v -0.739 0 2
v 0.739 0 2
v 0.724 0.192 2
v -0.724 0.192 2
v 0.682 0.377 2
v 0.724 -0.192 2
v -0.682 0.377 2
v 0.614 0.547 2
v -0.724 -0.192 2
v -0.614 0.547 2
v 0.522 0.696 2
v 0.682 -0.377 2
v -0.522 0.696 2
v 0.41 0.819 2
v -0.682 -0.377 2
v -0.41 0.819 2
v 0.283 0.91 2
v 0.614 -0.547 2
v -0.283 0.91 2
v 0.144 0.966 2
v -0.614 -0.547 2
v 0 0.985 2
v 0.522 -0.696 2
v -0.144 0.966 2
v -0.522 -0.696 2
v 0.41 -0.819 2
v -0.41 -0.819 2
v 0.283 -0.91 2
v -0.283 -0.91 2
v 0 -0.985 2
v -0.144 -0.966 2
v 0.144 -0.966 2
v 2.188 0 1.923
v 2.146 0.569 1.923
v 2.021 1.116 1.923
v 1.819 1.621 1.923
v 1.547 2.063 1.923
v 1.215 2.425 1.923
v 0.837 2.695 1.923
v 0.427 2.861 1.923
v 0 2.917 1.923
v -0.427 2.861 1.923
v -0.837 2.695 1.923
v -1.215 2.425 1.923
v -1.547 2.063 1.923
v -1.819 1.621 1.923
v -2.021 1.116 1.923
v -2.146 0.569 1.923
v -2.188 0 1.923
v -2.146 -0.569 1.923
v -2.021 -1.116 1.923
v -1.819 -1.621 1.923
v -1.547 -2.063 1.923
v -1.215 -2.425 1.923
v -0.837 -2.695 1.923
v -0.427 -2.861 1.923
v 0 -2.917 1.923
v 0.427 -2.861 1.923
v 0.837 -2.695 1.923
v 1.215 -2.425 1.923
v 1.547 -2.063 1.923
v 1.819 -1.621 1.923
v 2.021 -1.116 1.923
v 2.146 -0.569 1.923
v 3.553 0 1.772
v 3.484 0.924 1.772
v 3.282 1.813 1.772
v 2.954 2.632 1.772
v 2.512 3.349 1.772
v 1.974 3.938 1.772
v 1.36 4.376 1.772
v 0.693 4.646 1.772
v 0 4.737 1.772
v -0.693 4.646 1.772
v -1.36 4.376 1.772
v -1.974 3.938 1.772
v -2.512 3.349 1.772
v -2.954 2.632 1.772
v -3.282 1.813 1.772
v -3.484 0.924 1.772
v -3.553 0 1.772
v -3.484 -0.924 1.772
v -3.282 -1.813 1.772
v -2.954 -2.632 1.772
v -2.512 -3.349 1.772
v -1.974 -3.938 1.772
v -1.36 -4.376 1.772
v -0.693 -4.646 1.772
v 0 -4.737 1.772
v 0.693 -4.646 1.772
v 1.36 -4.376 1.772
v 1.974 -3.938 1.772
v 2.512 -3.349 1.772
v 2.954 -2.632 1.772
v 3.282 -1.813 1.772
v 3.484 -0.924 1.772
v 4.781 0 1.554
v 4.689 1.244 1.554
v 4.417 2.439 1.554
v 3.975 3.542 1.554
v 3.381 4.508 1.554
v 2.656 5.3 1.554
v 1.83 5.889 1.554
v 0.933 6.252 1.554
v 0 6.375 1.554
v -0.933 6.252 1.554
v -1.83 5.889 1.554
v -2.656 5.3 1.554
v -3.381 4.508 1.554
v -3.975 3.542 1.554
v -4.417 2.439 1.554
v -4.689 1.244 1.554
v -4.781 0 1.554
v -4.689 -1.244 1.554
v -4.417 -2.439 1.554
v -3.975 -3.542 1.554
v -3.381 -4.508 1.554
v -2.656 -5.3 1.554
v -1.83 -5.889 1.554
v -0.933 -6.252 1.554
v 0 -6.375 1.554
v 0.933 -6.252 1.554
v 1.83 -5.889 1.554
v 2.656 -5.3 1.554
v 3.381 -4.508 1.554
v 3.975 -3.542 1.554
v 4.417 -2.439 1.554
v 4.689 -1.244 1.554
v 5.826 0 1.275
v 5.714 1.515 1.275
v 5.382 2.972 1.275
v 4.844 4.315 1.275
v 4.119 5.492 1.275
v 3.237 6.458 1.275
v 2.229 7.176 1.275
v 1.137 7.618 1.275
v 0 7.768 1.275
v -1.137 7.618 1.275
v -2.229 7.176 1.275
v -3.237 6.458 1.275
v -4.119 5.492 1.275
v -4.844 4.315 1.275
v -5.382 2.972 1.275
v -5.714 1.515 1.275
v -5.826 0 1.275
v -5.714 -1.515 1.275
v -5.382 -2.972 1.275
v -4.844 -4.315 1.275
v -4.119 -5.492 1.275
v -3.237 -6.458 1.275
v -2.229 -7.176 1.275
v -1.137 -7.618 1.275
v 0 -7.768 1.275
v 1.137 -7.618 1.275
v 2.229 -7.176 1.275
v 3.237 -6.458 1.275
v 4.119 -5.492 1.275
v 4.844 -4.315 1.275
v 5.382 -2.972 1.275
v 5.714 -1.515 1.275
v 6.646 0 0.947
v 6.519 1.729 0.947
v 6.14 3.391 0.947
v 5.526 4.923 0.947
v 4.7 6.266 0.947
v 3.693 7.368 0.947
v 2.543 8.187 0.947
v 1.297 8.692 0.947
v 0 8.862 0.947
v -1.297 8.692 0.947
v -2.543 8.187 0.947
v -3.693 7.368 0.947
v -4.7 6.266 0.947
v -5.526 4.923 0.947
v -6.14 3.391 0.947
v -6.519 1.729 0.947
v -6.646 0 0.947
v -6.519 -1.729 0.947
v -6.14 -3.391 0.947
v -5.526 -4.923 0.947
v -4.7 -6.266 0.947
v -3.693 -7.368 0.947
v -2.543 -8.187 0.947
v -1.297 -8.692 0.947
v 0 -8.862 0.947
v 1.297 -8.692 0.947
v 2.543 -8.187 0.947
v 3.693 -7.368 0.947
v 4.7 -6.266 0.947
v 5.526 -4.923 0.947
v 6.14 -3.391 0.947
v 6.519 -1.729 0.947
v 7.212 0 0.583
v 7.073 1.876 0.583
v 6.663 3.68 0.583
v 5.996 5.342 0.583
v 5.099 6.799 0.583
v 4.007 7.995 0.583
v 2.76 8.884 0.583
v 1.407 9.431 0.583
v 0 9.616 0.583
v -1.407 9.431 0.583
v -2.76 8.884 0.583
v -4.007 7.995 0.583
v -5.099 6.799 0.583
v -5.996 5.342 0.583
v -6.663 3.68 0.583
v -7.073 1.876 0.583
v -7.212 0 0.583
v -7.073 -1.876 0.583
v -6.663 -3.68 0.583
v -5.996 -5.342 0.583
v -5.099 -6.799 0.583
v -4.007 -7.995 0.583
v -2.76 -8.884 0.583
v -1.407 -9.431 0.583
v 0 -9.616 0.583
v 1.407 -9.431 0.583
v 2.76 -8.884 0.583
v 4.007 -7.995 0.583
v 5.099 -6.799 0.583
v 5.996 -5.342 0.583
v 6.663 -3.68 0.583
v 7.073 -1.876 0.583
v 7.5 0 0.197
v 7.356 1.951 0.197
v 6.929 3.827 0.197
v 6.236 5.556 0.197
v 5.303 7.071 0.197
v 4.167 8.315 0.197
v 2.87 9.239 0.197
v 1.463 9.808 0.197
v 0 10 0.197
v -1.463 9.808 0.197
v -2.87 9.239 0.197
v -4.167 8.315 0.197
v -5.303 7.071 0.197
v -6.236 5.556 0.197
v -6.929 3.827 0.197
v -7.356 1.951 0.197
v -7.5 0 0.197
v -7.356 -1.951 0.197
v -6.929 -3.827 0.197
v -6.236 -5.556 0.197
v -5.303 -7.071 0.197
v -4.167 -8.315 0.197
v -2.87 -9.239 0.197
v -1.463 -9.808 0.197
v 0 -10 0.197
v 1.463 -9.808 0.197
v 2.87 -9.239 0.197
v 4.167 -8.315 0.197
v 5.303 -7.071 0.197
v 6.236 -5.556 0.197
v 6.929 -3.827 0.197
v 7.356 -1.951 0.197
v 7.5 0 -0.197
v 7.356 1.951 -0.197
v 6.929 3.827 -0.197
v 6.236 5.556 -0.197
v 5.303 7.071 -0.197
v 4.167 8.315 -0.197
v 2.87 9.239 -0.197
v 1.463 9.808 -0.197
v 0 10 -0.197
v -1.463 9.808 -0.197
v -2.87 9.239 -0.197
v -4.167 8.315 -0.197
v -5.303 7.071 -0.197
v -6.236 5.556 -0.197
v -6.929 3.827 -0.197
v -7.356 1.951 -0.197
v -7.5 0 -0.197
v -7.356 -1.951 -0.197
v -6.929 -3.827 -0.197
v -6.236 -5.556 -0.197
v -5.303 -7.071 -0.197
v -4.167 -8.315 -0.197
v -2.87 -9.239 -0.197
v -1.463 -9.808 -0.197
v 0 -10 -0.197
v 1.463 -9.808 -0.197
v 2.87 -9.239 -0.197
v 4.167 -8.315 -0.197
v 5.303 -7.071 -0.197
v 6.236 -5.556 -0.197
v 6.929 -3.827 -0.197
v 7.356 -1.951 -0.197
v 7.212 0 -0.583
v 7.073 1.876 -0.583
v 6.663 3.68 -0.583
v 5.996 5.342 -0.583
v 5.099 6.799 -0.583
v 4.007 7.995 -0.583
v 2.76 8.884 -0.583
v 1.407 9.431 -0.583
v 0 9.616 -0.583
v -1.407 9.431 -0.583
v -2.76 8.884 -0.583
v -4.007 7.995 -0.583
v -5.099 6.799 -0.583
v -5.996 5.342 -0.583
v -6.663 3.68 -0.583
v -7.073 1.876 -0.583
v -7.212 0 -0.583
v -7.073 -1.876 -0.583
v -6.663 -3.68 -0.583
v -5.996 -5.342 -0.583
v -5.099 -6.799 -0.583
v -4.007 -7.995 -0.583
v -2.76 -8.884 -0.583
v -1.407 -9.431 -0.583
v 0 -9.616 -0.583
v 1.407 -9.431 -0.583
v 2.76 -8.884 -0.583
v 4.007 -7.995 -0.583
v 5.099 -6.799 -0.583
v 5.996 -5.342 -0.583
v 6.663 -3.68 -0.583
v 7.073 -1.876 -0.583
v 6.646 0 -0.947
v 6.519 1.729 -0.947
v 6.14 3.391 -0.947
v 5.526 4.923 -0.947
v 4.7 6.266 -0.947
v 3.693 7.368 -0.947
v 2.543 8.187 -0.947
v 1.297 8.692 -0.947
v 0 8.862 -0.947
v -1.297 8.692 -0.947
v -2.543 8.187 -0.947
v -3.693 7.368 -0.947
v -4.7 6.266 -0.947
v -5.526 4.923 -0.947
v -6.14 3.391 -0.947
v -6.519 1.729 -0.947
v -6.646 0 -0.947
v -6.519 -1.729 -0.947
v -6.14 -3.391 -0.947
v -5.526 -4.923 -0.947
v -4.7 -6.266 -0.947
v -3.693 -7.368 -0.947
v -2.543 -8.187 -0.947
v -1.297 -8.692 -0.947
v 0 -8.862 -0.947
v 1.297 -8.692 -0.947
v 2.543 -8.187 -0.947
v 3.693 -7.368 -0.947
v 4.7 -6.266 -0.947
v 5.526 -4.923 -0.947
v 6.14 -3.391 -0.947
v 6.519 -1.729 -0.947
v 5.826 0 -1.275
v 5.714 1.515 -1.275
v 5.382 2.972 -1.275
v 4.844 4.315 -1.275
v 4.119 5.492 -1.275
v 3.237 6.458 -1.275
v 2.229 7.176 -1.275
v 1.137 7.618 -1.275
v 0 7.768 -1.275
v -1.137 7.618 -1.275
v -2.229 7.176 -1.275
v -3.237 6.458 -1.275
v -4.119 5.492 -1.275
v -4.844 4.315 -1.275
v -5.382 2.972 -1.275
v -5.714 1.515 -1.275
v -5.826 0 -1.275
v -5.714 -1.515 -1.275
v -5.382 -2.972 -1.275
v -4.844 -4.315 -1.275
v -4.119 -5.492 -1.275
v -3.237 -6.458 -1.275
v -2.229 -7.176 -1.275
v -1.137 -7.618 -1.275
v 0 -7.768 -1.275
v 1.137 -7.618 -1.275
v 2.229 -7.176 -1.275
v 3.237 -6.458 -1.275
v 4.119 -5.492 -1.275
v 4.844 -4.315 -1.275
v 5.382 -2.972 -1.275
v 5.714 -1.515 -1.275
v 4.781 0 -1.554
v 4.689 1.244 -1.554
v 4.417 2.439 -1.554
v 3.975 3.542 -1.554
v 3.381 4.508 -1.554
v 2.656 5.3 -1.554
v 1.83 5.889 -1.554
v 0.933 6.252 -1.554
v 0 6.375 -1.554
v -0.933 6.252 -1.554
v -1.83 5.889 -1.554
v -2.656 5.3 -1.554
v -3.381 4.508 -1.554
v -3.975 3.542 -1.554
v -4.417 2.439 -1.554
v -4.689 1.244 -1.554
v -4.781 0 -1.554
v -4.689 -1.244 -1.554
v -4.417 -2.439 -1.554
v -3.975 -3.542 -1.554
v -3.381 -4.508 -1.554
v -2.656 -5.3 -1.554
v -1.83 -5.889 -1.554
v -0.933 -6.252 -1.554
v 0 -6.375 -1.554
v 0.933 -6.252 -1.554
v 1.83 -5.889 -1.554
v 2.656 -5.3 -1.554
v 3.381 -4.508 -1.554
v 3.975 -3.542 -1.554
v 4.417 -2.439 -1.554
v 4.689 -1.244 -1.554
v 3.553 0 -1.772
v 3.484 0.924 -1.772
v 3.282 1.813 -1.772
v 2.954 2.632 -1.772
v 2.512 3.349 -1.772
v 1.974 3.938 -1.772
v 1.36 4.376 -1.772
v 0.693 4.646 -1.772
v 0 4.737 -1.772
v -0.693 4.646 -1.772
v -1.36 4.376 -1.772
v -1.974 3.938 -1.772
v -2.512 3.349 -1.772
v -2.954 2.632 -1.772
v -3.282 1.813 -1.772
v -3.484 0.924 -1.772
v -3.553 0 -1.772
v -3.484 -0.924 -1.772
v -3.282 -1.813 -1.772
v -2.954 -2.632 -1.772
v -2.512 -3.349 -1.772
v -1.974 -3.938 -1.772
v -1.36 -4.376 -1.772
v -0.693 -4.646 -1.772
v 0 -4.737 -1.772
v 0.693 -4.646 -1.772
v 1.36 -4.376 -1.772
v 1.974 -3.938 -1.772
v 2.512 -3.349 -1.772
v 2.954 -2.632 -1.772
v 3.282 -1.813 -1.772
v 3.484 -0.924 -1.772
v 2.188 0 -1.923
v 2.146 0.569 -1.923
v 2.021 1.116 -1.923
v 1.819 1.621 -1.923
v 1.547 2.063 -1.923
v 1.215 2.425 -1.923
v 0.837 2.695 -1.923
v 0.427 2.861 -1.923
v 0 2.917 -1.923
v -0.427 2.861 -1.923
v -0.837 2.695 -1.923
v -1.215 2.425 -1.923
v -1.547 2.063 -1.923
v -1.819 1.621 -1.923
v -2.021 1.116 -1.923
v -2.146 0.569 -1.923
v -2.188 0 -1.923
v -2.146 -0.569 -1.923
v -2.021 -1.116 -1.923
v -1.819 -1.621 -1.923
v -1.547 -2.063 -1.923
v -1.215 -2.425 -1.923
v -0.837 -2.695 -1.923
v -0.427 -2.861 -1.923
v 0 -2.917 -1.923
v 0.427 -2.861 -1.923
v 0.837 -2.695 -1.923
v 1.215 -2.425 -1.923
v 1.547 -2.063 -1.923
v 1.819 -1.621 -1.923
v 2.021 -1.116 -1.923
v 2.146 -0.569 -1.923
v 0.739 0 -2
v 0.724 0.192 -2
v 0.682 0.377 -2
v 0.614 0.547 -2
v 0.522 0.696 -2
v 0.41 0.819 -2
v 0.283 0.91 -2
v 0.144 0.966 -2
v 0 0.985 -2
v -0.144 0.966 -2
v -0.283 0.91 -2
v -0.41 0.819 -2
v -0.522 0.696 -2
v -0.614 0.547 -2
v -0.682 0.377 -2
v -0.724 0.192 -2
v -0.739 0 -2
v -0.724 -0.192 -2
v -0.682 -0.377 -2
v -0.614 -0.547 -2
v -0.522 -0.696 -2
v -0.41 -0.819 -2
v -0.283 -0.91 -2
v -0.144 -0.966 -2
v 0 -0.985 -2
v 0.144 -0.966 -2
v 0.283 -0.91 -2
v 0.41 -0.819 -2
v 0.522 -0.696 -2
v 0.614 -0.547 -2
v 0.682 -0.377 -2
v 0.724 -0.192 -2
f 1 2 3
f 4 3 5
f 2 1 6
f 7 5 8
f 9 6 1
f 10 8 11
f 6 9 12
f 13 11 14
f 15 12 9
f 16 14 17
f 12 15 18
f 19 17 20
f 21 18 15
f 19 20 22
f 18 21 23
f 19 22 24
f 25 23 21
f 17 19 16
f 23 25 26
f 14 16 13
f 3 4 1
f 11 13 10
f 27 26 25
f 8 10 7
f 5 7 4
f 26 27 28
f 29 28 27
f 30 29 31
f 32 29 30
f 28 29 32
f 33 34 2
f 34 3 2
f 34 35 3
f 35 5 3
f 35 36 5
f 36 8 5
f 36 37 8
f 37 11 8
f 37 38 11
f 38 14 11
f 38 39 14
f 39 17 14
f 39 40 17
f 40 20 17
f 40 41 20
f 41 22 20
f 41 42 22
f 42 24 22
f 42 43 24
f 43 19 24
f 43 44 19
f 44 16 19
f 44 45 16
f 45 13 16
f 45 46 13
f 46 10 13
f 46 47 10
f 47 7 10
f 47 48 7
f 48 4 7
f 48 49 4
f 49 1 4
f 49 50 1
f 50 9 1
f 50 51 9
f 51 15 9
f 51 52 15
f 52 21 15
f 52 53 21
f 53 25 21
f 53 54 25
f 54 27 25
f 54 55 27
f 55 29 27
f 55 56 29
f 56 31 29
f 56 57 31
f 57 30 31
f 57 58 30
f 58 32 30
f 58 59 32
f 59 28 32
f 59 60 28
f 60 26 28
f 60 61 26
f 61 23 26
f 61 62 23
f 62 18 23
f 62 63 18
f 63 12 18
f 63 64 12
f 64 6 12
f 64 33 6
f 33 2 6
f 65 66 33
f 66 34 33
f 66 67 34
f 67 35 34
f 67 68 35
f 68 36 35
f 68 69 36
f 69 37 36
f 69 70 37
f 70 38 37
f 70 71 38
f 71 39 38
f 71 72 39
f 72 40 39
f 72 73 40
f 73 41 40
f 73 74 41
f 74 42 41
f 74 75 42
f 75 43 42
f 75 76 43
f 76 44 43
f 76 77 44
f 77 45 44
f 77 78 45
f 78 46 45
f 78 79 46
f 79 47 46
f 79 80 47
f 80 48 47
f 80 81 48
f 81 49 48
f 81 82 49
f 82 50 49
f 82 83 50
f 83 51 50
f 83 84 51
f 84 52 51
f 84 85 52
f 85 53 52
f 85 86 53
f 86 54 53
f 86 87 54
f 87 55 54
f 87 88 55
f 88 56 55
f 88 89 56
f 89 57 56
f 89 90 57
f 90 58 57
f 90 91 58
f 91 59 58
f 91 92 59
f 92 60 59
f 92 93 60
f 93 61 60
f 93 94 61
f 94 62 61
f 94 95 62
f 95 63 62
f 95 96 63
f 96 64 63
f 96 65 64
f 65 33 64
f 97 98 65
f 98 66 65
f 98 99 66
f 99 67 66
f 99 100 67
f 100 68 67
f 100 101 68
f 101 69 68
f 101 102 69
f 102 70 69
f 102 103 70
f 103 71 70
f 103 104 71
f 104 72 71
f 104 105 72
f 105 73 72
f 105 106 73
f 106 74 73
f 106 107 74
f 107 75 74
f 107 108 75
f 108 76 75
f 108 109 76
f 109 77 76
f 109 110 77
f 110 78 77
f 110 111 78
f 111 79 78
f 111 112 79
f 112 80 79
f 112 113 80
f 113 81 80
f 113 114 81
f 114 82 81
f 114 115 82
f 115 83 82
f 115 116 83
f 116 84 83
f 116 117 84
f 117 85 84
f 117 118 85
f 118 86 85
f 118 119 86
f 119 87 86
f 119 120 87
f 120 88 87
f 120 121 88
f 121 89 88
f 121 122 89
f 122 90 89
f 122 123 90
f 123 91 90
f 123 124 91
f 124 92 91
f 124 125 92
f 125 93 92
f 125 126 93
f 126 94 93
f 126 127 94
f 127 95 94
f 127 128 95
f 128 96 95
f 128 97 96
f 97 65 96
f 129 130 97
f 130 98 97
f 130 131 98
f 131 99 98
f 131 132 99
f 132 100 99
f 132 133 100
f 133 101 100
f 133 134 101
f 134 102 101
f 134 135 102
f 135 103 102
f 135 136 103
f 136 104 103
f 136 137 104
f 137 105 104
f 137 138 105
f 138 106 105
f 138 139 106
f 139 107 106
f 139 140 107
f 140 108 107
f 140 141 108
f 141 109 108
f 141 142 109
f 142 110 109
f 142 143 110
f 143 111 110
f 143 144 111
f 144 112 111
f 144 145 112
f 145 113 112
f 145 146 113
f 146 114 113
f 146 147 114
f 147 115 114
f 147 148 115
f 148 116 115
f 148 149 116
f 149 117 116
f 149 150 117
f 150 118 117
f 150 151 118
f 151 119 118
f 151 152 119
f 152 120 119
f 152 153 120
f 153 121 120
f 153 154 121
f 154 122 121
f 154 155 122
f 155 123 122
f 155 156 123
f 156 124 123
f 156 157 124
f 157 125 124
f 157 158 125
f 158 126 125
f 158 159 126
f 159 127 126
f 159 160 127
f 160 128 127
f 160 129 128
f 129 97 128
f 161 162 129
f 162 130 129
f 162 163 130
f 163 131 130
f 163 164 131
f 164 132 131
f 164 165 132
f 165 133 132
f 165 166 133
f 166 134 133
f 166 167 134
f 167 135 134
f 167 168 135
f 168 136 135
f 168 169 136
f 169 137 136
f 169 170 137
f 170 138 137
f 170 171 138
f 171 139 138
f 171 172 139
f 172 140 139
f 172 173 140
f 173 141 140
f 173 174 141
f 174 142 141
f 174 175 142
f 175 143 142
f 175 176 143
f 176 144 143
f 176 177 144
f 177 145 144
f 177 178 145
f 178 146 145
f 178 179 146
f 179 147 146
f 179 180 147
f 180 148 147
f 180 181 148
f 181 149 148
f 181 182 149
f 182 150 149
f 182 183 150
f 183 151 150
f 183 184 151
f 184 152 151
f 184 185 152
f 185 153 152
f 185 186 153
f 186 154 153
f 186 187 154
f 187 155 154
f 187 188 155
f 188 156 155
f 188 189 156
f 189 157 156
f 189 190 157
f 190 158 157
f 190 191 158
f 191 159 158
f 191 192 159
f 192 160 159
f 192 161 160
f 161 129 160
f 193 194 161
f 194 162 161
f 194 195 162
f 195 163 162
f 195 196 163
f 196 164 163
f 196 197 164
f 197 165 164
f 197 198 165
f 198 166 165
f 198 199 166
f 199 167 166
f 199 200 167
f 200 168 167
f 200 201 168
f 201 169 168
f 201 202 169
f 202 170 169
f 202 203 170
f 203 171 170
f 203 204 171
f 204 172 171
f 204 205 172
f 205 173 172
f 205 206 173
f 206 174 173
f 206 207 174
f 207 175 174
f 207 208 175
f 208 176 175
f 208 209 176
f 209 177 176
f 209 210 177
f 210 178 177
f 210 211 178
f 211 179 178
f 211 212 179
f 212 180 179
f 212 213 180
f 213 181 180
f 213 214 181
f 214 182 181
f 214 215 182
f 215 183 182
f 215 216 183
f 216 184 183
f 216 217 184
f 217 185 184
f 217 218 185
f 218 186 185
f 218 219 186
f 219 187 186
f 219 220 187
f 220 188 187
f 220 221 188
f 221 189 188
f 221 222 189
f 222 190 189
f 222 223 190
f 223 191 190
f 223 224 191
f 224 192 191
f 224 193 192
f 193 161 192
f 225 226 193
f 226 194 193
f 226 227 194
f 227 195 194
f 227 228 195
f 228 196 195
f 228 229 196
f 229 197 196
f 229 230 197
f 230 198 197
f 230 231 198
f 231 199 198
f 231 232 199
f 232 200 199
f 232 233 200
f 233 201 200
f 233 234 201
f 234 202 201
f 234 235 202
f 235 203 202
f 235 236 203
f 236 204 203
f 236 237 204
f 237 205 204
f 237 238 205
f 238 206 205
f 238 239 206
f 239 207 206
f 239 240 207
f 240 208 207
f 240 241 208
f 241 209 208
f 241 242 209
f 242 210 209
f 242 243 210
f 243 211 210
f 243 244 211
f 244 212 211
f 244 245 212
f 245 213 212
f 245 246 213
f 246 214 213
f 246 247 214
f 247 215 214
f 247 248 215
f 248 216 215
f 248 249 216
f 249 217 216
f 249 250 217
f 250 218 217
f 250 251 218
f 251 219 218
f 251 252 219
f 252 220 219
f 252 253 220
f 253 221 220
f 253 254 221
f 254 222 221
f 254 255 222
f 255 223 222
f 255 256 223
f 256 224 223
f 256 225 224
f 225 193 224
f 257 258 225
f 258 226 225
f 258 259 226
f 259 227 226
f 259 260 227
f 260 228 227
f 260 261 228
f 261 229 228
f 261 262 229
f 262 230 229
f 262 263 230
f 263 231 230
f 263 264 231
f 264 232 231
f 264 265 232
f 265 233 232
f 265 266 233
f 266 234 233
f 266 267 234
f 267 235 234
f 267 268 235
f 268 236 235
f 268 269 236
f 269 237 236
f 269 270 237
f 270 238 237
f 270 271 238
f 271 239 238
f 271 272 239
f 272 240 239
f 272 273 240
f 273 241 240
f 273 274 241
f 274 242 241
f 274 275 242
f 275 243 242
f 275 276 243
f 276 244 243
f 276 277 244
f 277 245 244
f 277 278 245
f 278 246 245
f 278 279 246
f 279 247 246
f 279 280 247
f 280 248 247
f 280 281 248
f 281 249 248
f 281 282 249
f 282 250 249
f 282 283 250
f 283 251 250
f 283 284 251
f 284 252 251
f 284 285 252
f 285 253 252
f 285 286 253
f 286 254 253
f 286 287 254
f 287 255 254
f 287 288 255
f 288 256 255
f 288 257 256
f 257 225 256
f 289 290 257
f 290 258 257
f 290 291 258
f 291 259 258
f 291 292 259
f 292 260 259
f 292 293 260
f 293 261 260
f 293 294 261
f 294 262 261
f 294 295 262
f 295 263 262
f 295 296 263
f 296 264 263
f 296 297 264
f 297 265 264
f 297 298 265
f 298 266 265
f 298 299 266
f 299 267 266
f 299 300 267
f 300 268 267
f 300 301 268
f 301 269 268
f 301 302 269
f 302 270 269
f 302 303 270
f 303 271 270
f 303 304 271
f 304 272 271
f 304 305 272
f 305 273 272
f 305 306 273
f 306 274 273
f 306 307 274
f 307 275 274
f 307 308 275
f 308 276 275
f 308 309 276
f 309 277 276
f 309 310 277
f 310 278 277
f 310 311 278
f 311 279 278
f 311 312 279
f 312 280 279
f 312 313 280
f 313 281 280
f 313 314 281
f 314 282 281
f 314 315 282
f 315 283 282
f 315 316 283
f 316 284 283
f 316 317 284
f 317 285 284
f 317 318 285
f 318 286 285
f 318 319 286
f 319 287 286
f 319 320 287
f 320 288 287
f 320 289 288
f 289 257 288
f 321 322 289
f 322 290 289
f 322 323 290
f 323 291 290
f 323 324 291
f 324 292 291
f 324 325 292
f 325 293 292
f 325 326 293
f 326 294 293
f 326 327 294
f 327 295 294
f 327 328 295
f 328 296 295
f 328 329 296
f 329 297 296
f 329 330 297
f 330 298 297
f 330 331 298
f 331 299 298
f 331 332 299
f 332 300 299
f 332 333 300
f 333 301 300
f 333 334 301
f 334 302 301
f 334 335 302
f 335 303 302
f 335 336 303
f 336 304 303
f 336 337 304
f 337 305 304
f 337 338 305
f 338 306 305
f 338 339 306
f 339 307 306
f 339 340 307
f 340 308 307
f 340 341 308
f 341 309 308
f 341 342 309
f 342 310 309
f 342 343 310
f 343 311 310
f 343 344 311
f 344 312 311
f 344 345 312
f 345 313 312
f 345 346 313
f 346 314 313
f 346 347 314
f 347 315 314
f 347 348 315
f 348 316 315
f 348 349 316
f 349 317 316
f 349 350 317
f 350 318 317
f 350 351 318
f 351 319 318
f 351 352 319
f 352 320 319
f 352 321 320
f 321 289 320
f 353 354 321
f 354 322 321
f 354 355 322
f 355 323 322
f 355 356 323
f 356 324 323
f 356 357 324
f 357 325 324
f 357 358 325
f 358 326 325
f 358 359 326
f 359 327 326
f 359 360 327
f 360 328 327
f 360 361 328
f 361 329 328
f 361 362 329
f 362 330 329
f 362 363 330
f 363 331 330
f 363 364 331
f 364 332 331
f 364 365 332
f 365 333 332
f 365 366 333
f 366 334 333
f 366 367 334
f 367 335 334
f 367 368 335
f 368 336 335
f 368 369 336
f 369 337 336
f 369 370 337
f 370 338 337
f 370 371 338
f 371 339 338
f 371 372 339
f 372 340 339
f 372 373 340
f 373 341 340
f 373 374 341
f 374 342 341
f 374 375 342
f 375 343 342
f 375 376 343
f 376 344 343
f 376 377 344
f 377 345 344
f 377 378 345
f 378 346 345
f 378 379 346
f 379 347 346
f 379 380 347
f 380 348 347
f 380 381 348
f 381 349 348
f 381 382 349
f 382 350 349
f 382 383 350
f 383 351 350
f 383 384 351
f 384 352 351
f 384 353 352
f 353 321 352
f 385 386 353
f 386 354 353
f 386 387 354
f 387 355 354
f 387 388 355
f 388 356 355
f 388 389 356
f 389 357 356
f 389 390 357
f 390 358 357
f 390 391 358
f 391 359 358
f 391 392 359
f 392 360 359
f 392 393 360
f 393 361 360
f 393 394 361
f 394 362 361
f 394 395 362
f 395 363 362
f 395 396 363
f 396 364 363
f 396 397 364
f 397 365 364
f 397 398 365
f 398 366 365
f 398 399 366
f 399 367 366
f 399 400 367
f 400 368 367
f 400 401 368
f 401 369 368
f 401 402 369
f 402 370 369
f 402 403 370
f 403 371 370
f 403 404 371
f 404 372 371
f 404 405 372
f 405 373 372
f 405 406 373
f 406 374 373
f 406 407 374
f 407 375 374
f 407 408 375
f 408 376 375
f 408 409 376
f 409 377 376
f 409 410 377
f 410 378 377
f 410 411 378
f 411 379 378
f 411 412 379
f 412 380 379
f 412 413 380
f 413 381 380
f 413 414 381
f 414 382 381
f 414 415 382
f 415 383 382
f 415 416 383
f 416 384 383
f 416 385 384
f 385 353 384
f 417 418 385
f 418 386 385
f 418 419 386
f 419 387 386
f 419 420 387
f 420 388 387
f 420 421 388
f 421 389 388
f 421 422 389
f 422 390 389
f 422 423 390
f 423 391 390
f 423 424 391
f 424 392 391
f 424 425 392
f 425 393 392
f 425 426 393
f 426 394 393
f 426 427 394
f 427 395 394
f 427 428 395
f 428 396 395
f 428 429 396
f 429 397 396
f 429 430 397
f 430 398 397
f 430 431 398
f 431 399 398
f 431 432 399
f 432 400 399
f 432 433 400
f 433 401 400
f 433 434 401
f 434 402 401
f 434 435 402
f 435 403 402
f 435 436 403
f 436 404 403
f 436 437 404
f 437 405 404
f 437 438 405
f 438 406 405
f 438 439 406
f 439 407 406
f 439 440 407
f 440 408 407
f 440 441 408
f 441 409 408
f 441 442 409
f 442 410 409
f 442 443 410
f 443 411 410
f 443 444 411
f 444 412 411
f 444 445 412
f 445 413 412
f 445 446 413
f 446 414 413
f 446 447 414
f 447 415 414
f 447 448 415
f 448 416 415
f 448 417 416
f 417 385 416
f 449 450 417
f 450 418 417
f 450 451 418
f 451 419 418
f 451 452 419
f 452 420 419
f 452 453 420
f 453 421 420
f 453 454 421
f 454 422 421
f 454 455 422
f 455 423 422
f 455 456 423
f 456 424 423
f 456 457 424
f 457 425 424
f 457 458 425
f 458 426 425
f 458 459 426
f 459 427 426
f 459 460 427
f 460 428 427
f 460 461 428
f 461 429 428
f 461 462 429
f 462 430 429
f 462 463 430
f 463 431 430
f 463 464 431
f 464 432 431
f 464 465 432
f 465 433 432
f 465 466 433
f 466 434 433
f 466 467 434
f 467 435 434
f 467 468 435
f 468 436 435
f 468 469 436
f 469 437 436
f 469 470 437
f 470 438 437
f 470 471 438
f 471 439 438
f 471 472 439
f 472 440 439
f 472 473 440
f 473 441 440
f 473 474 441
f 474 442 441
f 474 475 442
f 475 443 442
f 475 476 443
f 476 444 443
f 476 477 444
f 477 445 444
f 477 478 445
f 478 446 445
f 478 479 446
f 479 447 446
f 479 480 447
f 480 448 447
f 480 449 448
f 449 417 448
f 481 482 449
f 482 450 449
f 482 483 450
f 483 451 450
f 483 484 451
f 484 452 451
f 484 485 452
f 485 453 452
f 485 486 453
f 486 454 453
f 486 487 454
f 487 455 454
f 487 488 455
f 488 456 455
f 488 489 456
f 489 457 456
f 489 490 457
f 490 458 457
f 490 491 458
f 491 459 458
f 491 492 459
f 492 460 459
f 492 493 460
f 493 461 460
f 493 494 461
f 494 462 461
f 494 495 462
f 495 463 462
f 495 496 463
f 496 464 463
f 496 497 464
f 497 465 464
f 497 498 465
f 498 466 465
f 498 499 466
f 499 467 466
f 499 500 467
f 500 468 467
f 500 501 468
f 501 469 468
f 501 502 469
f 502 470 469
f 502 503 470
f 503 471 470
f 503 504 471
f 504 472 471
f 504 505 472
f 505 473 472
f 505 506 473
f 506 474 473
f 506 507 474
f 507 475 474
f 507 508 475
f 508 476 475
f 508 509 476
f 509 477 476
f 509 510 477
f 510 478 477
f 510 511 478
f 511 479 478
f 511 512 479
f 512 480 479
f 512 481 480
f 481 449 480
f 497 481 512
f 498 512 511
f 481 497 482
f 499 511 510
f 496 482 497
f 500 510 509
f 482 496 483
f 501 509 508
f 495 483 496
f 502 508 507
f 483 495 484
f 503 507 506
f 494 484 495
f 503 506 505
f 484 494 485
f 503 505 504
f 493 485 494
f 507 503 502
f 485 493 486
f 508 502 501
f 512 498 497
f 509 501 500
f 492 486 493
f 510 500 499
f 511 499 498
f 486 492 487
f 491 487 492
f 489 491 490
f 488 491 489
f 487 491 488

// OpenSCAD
resize([15, 20, 4]) sphere(r=5, $fn=32);
%color([0.5,0.5,1], alpha=0.3) sphere(r=5, $fn=32);
